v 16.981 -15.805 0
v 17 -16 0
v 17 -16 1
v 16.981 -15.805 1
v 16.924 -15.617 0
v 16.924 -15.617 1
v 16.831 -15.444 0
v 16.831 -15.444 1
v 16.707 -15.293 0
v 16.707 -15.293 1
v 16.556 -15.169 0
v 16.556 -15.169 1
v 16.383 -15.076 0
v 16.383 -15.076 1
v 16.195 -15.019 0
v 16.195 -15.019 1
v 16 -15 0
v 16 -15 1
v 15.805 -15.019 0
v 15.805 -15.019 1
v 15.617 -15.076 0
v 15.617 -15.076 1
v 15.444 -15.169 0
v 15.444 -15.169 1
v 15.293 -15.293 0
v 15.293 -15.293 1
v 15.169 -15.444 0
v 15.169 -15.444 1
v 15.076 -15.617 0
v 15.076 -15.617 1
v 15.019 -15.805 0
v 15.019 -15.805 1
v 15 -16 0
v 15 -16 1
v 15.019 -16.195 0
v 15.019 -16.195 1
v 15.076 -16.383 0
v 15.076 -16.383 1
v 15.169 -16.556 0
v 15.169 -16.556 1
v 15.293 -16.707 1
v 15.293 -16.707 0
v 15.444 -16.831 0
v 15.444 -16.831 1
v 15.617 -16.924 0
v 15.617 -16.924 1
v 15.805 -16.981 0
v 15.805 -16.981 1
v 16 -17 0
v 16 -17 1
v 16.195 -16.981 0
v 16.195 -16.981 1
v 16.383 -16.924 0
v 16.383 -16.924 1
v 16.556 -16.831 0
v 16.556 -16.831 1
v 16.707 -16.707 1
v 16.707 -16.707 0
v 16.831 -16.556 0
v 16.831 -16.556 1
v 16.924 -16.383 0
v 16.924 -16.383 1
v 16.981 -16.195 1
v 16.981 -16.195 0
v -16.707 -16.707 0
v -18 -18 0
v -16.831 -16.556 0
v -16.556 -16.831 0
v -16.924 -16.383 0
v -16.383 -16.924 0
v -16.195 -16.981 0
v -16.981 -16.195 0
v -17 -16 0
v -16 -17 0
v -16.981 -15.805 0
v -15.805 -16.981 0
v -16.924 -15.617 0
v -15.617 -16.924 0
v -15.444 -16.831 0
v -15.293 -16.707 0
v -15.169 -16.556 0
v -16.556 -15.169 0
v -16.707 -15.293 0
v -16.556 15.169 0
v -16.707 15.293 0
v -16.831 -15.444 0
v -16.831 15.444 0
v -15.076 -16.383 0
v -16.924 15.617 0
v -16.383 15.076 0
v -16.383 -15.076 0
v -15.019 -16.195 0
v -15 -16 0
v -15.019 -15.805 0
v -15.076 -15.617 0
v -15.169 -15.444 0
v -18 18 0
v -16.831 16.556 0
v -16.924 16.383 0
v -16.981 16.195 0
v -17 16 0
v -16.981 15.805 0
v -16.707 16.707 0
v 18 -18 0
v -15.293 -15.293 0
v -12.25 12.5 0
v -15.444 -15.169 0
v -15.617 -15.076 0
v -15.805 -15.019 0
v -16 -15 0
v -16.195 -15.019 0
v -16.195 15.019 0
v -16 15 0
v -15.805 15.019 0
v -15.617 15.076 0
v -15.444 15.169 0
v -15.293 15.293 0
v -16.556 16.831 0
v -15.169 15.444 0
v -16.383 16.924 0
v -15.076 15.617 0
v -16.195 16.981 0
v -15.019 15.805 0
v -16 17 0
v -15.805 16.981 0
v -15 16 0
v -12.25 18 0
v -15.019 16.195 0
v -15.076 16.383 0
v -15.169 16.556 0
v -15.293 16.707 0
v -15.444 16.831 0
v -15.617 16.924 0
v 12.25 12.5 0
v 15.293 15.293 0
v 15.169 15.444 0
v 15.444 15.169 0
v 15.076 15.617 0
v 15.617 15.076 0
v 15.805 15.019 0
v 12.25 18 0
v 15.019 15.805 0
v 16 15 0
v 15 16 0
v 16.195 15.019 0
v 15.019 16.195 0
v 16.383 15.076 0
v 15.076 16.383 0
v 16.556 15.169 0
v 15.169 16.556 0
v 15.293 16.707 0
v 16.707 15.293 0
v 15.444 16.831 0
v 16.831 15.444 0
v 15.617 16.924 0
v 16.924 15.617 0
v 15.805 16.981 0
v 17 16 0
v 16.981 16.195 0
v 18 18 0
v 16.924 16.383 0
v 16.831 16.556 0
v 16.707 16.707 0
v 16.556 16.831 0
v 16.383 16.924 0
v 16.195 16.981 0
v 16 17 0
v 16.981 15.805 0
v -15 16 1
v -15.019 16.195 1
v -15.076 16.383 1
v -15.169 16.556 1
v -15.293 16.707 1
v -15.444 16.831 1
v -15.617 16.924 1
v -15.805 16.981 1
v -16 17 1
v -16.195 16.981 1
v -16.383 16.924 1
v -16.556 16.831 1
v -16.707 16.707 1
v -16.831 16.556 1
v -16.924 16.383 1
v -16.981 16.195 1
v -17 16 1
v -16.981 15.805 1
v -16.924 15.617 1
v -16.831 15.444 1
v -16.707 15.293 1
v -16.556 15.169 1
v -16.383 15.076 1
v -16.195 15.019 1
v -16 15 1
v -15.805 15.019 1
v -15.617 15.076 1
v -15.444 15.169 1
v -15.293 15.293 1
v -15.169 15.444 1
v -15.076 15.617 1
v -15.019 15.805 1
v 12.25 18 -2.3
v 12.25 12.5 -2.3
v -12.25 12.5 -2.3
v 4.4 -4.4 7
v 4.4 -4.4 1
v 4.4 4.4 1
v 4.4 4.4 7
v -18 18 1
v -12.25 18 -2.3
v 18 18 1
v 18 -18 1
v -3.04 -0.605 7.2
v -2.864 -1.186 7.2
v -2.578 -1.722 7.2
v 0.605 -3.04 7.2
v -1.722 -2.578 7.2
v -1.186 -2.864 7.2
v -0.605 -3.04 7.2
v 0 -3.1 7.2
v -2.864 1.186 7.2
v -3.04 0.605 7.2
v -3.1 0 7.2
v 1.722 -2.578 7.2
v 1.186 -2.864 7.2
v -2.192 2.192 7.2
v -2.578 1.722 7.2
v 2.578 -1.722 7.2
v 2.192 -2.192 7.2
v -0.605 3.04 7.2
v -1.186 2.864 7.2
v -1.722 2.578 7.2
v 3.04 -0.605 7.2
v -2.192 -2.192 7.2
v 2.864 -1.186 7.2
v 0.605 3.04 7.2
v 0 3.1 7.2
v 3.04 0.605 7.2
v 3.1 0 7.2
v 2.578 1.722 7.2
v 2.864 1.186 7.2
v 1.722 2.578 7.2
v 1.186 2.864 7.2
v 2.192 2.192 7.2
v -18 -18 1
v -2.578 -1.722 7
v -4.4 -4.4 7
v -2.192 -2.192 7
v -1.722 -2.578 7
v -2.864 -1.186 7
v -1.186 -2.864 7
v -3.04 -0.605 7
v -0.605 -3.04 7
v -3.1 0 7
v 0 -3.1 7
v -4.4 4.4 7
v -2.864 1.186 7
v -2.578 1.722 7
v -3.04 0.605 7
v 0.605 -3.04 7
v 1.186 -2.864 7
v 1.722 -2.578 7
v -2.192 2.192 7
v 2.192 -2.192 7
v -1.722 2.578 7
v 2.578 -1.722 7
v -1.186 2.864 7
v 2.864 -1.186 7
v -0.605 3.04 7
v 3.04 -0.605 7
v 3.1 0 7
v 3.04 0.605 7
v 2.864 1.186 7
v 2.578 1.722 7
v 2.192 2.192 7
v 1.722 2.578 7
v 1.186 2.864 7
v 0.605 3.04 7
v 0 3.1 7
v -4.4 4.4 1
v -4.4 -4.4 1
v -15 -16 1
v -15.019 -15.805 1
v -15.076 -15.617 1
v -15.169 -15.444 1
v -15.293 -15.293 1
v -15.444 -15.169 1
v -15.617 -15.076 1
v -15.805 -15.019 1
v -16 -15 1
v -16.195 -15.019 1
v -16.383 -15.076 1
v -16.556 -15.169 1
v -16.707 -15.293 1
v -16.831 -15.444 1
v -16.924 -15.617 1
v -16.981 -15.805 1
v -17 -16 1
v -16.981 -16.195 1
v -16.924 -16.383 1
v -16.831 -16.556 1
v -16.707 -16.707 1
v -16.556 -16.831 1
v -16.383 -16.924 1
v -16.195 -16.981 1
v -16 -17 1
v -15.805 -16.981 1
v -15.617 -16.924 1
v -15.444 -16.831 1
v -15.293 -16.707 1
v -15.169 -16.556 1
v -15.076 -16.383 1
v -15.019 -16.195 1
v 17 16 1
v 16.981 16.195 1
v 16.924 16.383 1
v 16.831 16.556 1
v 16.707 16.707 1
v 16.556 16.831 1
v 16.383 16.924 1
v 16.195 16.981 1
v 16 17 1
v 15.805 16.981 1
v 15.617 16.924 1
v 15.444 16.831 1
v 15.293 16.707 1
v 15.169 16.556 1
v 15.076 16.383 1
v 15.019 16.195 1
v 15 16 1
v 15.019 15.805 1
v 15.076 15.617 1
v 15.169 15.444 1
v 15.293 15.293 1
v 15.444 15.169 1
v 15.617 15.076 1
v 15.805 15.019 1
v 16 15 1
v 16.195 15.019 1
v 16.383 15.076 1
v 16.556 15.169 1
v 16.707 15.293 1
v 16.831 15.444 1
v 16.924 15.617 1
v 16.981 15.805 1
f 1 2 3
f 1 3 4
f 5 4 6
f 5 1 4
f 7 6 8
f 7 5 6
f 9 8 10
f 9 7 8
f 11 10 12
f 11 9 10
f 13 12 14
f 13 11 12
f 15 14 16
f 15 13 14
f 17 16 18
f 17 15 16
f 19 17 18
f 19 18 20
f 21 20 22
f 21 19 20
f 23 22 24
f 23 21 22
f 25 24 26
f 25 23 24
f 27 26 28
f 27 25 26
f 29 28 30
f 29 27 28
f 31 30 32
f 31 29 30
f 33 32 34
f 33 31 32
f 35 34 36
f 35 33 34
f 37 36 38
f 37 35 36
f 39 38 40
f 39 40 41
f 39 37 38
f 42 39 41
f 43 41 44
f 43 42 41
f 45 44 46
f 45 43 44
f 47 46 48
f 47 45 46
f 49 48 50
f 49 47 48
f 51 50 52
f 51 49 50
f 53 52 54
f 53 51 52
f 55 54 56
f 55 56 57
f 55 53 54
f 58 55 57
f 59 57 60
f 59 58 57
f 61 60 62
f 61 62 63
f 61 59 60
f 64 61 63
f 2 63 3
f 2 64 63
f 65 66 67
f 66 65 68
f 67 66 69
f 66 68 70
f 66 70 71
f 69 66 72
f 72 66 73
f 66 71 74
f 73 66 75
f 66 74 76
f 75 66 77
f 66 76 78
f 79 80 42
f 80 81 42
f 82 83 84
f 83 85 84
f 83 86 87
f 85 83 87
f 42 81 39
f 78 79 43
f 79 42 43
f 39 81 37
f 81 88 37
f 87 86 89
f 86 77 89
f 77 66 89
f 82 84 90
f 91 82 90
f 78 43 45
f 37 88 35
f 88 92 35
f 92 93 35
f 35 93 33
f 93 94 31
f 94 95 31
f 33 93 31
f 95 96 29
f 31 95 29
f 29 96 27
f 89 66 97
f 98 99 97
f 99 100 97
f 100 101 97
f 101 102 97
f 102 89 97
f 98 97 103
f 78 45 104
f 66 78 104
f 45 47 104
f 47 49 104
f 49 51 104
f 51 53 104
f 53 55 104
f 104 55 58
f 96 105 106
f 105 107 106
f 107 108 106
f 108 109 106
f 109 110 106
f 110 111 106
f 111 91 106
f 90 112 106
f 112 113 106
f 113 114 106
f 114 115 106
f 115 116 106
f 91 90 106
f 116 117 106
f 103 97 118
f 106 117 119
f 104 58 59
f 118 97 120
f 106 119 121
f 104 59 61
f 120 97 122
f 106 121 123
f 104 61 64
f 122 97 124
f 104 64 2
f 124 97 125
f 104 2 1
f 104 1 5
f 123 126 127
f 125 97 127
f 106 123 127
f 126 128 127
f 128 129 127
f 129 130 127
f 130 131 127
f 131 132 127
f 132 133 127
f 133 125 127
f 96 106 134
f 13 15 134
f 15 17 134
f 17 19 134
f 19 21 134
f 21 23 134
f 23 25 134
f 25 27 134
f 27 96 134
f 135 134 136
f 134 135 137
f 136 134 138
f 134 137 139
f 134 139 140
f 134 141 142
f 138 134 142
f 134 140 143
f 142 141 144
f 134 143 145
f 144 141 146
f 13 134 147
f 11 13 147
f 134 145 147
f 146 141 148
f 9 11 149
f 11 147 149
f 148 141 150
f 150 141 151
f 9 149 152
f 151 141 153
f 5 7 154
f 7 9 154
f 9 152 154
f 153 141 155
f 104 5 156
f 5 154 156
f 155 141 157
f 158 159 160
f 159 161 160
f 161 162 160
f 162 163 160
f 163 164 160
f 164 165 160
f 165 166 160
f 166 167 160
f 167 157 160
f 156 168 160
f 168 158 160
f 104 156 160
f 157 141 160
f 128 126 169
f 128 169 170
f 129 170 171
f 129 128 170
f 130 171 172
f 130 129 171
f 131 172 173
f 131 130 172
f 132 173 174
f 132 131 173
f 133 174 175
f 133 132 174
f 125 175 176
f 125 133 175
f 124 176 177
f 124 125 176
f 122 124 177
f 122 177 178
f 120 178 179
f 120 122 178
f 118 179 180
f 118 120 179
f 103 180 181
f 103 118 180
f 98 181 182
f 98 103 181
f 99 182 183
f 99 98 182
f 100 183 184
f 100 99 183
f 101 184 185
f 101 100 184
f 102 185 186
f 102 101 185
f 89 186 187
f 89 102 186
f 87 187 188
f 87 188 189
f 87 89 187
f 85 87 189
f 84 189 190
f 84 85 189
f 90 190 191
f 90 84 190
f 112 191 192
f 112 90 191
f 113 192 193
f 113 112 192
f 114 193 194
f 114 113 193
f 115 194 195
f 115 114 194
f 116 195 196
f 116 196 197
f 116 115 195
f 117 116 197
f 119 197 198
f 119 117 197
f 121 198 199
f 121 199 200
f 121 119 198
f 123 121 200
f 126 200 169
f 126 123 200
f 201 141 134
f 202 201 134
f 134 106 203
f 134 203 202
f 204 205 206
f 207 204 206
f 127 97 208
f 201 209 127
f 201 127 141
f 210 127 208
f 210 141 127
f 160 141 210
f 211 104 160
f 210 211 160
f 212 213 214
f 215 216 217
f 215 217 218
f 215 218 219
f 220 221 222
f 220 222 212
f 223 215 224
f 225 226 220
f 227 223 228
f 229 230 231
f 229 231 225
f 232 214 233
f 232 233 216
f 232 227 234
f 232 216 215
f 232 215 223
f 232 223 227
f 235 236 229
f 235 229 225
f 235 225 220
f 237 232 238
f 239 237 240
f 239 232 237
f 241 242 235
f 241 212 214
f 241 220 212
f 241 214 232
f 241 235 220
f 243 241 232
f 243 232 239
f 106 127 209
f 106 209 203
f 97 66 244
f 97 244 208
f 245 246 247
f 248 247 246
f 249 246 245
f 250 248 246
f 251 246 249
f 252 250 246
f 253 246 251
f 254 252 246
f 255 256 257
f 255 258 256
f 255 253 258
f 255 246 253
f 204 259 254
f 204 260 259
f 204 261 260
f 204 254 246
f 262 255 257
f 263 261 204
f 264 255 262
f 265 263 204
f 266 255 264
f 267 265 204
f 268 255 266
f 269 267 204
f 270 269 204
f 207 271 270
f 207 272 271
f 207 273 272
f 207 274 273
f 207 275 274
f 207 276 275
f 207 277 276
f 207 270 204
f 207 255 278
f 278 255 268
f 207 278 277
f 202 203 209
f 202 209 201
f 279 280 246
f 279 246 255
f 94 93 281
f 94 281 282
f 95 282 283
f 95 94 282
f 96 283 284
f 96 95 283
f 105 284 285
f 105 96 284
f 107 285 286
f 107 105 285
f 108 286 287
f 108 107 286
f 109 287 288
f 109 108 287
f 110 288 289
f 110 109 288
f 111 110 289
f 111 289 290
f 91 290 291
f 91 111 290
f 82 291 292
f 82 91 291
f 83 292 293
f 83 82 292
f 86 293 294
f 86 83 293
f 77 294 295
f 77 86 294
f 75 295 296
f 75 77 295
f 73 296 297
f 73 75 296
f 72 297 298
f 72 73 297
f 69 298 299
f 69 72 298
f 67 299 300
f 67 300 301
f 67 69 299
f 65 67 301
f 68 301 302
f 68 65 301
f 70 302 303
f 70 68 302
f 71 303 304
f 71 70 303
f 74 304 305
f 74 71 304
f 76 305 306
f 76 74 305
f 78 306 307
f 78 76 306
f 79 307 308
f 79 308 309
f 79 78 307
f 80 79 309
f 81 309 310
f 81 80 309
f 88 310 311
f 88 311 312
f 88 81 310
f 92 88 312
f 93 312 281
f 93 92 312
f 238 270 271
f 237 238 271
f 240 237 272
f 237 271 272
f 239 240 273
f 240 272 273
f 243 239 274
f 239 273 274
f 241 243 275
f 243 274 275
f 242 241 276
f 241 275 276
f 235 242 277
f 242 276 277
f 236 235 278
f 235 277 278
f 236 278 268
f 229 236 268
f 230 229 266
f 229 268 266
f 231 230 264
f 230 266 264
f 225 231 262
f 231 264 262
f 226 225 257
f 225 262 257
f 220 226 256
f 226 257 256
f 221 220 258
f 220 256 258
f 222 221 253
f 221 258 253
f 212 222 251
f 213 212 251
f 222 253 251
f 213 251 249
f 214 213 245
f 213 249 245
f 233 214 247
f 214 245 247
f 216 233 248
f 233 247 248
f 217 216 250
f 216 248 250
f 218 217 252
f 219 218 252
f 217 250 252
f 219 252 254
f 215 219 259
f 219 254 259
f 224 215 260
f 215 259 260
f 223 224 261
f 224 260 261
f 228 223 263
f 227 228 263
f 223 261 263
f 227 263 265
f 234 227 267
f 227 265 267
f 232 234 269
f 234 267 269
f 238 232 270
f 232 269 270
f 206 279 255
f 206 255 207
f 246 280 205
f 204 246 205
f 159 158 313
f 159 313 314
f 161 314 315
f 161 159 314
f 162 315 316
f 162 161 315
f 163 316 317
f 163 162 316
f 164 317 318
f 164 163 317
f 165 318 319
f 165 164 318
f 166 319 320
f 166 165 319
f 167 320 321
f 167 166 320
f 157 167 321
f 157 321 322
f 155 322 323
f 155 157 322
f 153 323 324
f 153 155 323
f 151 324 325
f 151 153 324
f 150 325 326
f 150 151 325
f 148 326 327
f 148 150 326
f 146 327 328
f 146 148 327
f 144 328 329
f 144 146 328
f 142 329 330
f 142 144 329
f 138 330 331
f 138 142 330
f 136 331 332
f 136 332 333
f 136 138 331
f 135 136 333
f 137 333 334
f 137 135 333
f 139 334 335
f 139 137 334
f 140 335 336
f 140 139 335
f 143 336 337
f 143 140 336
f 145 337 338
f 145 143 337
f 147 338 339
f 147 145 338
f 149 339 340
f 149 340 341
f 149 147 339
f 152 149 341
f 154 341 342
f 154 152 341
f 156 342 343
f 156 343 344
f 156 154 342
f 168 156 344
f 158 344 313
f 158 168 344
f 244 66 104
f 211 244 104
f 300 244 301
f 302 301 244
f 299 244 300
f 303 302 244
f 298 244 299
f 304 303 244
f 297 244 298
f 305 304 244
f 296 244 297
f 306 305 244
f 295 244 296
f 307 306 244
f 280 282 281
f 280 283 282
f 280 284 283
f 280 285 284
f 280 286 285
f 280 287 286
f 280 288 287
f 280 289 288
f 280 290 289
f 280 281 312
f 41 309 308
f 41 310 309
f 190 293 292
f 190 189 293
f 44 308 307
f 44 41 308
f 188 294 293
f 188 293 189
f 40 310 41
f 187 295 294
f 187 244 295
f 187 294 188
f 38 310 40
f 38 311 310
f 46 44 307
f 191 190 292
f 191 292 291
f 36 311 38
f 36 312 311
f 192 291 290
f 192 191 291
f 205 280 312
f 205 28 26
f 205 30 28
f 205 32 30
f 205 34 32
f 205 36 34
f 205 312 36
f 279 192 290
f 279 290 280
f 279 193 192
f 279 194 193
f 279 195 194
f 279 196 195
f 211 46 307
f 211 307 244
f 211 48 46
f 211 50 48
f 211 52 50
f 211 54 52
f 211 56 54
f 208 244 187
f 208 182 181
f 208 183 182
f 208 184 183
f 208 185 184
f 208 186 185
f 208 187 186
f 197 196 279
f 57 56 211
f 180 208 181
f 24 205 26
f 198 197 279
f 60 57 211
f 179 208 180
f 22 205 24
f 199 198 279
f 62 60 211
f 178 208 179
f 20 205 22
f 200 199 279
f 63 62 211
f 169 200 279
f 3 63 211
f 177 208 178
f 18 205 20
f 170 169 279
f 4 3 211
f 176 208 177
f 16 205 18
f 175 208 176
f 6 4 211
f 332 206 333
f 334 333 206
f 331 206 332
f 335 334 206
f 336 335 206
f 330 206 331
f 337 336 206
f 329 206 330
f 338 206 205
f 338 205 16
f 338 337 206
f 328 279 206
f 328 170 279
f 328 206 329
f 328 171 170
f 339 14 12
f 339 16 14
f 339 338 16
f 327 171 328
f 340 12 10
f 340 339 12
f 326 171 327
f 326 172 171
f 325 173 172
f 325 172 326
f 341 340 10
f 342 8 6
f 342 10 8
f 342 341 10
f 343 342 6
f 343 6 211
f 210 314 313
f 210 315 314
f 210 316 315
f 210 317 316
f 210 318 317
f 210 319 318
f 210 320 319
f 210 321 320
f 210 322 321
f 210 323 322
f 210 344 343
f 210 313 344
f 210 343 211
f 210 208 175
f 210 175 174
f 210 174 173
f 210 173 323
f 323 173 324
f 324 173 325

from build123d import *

# Parameters (mm, degrees)
F0_W     = 36
F0_H     = 36
F0_R     = 1
F1_DEPTH = 1
F2_W     = 8.8
F2_H     = 8.8
F3_DEPTH = 6
F4_W     = 24.5
F4_H     = 5.5
F5_DEPTH = 2.3
F6_R     = 3.1
F7_DEPTH = 0.2


with BuildPart() as f1:
    # F0 (on Top) → F1 (new body)
    with BuildSketch(Plane.XY):
        Rectangle(F0_W, F0_H)
        with Locations((-16, -16)):
            Circle(F0_R, mode=Mode.SUBTRACT)
        with Locations((16, -16)):
            Circle(F0_R, mode=Mode.SUBTRACT)
        with Locations((-16, 16)):
            Circle(F0_R, mode=Mode.SUBTRACT)
        with Locations((16, 16)):
            Circle(F0_R, mode=Mode.SUBTRACT)
    extrude(amount=F1_DEPTH)

    # F2 (on face) → F3 (join)
    with BuildSketch(Plane.XY.offset(1)):
        Rectangle(F2_W, F2_H)
    extrude(amount=F3_DEPTH)

    # F4 (on face) → F5 (join)
    with BuildSketch(Plane(origin=(0, 0, 0), x_dir=(1, 0, 0), z_dir=(0, 0, -1))):
        with Locations((0, -15.25)):
            Rectangle(F4_W, F4_H)
    extrude(amount=F5_DEPTH)

    # F6 (on face) → F7 (join)
    with BuildSketch(Plane.XY.offset(7)):
        Circle(F6_R)
    extrude(amount=F7_DEPTH)


solid = f1.part
